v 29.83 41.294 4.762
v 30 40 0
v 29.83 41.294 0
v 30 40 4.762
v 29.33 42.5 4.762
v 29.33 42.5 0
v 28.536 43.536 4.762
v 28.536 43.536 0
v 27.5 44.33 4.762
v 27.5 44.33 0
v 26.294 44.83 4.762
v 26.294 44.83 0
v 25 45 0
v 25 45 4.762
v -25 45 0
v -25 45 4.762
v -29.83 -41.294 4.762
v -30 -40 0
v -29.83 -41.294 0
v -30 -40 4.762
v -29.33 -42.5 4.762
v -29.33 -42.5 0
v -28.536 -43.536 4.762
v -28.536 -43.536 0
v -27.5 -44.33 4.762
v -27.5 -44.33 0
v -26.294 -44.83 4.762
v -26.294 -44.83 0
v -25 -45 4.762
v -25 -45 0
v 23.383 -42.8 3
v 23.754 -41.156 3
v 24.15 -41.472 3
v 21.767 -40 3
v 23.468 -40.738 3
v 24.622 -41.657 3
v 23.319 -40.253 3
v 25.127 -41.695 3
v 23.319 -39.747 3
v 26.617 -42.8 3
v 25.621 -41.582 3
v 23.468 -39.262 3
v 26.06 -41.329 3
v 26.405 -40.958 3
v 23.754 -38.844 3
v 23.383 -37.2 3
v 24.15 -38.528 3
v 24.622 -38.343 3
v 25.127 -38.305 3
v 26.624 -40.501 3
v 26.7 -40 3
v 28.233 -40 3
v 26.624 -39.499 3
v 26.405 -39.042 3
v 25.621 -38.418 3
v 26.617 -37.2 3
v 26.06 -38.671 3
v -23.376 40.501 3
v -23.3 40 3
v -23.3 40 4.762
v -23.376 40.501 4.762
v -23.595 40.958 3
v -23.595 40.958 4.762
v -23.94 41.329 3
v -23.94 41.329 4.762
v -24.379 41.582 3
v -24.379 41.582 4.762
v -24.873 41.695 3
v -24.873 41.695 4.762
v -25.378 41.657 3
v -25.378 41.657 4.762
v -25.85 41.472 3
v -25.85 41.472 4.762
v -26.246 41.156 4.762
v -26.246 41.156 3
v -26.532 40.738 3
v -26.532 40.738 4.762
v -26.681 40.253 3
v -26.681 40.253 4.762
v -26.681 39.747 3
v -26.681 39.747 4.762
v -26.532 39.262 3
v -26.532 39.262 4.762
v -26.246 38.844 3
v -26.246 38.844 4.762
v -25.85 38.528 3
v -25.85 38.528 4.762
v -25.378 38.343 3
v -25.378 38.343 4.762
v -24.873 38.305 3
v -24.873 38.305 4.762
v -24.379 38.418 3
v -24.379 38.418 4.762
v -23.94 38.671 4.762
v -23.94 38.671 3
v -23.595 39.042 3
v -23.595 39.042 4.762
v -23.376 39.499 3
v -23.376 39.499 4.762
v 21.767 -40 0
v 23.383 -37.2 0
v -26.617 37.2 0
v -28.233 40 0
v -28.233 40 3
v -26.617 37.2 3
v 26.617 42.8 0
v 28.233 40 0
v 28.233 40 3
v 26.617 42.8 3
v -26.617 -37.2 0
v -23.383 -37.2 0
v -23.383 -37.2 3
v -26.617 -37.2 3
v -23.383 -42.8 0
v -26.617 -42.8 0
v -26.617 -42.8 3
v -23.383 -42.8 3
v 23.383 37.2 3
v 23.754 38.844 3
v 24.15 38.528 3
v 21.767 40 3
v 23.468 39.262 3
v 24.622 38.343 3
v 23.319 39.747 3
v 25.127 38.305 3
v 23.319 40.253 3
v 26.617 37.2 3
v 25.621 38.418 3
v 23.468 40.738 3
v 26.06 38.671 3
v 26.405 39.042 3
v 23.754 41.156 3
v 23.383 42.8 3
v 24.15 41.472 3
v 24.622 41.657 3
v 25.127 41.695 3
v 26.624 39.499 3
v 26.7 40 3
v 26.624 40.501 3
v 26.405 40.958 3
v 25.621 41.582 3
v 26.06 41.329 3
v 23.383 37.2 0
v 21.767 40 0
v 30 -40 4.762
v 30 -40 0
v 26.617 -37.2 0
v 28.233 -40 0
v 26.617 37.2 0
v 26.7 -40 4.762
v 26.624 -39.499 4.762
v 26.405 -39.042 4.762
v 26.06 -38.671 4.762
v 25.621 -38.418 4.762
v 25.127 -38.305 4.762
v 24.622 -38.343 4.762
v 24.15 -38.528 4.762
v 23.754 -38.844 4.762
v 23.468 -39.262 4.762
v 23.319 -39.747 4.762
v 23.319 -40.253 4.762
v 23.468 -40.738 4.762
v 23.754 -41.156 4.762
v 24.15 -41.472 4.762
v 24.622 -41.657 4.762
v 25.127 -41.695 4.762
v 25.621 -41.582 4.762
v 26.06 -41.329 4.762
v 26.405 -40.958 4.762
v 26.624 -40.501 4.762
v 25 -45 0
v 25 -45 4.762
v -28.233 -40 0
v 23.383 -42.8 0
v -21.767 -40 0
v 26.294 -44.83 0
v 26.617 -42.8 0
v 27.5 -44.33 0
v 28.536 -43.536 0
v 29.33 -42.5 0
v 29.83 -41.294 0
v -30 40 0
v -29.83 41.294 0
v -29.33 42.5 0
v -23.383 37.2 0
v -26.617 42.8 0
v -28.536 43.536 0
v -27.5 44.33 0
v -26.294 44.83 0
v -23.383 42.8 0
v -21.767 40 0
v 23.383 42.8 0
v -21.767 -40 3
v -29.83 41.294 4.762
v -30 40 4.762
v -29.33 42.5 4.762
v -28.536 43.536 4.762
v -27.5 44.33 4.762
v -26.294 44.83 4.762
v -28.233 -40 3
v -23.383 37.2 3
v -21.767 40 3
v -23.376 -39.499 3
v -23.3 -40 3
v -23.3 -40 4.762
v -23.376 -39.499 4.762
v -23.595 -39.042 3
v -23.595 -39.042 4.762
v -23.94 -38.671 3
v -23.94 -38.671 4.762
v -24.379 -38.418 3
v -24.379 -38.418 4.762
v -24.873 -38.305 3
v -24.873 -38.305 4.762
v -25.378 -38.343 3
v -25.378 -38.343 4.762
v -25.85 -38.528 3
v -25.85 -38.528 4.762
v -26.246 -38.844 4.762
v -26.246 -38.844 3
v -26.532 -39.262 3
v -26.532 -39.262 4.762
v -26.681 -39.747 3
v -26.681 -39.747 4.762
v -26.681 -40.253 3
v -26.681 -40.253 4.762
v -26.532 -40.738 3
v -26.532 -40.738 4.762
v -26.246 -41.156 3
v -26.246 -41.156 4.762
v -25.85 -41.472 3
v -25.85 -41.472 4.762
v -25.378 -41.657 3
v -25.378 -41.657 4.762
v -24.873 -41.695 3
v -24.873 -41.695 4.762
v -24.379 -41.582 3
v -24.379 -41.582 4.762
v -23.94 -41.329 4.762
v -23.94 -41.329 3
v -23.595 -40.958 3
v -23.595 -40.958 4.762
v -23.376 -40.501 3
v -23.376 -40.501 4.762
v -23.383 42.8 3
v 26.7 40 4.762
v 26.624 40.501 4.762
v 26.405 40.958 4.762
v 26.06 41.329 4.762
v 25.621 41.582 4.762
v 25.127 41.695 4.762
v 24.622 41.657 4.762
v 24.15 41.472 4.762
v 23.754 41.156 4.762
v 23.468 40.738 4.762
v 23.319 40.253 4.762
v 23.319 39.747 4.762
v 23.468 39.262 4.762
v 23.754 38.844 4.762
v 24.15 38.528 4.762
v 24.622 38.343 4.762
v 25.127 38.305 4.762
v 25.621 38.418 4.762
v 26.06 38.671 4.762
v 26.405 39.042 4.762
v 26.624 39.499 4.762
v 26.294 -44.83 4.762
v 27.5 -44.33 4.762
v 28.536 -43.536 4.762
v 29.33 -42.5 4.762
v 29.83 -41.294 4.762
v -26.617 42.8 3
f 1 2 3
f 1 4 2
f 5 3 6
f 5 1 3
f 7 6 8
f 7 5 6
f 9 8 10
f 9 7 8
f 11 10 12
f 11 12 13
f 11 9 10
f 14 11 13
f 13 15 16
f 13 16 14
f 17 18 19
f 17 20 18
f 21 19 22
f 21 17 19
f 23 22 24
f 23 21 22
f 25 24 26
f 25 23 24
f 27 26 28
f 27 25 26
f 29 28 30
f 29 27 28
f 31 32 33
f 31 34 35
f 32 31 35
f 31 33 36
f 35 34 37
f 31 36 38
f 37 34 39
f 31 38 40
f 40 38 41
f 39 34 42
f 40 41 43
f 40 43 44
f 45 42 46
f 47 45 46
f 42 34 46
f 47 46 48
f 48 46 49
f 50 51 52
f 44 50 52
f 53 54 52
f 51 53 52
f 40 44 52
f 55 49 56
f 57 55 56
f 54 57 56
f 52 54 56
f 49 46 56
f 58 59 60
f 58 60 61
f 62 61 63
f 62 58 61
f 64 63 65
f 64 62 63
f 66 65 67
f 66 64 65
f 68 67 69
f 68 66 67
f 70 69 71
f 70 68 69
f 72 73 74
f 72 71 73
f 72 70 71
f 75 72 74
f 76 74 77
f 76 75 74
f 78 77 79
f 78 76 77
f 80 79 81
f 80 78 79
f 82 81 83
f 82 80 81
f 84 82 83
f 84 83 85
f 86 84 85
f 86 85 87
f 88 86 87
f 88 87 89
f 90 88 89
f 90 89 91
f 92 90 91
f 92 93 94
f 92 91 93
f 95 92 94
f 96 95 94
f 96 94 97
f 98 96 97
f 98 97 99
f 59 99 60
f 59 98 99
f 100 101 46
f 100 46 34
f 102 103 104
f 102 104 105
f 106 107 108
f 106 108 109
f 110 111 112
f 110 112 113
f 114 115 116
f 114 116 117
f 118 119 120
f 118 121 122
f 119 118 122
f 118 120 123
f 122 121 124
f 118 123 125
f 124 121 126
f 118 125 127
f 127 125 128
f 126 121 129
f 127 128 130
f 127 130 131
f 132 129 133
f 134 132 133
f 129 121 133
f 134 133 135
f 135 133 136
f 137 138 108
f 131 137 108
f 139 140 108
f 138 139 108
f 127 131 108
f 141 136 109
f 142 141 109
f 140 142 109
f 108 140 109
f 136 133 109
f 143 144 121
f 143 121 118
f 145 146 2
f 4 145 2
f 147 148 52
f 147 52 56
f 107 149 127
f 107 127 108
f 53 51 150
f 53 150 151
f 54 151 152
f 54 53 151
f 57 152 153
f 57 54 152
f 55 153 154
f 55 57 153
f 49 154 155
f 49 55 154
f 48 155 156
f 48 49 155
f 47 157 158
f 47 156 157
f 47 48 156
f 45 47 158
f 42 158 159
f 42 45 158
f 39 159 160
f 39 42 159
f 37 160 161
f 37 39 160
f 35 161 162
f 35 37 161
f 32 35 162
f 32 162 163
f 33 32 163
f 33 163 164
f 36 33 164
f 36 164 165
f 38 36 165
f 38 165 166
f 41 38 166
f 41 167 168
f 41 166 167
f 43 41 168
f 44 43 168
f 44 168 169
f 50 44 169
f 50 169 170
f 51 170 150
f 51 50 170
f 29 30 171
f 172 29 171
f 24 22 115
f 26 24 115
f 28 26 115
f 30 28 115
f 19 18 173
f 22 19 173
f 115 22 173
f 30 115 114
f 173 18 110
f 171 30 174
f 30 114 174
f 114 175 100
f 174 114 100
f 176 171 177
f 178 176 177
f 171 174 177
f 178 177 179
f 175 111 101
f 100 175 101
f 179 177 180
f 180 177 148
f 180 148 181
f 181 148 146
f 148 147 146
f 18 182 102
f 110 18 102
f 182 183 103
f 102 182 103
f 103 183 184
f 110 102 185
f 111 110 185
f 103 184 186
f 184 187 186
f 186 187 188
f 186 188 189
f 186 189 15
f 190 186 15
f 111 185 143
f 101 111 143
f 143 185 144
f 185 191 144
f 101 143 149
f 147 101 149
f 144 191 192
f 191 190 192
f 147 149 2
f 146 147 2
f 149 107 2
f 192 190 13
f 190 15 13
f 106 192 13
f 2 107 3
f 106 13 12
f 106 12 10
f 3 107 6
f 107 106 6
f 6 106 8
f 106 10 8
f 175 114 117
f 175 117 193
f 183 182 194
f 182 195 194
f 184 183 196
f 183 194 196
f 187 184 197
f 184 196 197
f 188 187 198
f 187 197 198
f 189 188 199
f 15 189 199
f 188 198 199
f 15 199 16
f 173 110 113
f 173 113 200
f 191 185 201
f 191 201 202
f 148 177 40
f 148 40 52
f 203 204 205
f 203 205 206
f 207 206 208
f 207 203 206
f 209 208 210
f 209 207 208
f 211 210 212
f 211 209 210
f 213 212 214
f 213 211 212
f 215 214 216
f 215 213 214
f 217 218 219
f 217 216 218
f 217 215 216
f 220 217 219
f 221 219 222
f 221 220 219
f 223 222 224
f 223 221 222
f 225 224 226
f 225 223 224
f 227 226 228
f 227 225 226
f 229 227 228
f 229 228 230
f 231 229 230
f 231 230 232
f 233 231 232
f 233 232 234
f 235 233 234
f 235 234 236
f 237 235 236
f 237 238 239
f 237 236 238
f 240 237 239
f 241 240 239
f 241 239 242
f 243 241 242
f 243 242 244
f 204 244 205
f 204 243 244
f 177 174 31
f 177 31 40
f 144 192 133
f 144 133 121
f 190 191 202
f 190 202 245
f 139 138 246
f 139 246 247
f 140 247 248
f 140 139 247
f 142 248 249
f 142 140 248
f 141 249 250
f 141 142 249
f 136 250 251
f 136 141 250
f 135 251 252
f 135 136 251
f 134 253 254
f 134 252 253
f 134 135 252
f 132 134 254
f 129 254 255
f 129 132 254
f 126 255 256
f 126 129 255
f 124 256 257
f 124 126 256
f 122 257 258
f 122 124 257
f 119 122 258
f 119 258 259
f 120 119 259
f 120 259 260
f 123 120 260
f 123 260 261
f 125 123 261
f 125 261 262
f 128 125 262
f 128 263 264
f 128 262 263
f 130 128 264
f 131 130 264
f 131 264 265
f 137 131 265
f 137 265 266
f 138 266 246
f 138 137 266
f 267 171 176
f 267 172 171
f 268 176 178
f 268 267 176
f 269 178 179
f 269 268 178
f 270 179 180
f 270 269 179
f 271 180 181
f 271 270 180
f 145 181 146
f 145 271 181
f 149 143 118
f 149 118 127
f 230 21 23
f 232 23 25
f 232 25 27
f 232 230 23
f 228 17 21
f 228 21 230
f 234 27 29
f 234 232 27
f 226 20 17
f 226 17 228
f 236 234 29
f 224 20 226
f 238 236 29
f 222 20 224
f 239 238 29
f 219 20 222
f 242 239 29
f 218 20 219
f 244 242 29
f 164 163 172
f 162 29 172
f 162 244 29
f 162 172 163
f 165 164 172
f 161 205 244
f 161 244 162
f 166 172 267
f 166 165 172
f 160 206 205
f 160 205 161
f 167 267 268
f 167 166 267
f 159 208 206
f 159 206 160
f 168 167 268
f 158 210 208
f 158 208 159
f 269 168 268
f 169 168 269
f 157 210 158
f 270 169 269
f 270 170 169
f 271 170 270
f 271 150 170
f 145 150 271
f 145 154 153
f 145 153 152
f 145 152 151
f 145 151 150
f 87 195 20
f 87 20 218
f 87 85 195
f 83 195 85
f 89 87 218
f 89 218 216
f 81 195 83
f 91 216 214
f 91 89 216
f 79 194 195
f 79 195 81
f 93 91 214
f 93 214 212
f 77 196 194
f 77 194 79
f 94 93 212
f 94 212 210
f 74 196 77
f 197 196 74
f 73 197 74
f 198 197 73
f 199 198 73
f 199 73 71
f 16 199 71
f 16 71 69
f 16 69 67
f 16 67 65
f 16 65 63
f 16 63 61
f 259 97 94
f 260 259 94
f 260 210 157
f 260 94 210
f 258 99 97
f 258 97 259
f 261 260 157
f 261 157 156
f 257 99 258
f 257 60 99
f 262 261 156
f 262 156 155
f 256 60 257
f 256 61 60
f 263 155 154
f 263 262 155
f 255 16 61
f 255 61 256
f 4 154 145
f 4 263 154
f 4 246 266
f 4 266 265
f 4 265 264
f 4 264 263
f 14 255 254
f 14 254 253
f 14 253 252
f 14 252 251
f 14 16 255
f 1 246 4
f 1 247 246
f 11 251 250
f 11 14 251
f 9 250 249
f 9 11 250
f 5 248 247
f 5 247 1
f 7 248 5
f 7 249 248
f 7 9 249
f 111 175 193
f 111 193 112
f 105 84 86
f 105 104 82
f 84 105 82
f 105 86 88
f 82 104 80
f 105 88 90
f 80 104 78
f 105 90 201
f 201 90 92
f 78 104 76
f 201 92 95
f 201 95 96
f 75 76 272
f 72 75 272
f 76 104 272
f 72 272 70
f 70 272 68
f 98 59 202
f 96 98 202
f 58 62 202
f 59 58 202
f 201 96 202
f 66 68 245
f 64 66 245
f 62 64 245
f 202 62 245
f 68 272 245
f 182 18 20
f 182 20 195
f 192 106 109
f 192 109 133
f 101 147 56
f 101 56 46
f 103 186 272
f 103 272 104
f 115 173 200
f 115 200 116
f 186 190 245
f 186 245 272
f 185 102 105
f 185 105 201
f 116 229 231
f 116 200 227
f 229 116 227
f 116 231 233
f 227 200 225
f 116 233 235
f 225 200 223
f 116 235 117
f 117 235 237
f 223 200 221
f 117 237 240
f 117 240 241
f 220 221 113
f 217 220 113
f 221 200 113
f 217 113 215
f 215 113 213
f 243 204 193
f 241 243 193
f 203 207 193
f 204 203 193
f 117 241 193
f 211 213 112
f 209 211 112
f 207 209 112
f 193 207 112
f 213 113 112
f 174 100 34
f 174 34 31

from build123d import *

# Parameters (mm, degrees)
SKETCH1_W           = 60
SKETCH1_H           = 90
BOSS_EXTRUDE1_DEPTH = 4.7625
FILLET1_R           = 5
SKETCH2_R           = 1.7
CUT_EXTRUDE1_DEPTH  = 5
CUT_EXTRUDE2_DEPTH  = 3


with BuildPart() as part:
    # Sketch1 → Boss-Extrude1 (new body)
    with BuildSketch(Plane.XY):
        Rectangle(SKETCH1_W, SKETCH1_H)
    extrude(amount=BOSS_EXTRUDE1_DEPTH)

    # Fillet1
    fillet1_edges = [part.edges().sort_by_distance(p)[0] for p in [
        (-30, 45, 2.38125),
        (30, 45, 2.38125),
        (30, -45, 2.38125),
        (-30, -45, 2.38125),
    ]]
    fillet(fillet1_edges, radius=FILLET1_R)

    # Sketch2 → Cut-Extrude1 (cut)
    with BuildSketch(Plane.XY):
        with Locations((-25, 40)):
            Circle(SKETCH2_R)
        with Locations((25, 40)):
            Circle(SKETCH2_R)
        with Locations((25, -40)):
            Circle(SKETCH2_R)
        with Locations((-25, -40)):
            Circle(SKETCH2_R)
    extrude(amount=CUT_EXTRUDE1_DEPTH, mode=Mode.SUBTRACT)

    # Sketch3 → Cut-Extrude2 (cut)
    with BuildSketch(Plane.XY):
        Polygon((-23.383419246, 37.2), (-21.766838493, 40), (-23.383419246, 42.8), (-26.616580754, 42.8), (-28.233161507, 40), (-26.616580754, 37.2), align=None)
        Polygon((26.616580754, 37.2), (28.233161507, 40), (26.616580754, 42.8), (23.383419246, 42.8), (21.766838493, 40), (23.383419246, 37.2), align=None)
        Polygon((26.616580754, -42.8), (28.233161507, -40), (26.616580754, -37.2), (23.383419246, -37.2), (21.766838493, -40), (23.383419246, -42.8), align=None)
        Polygon((-23.383419246, -42.8), (-21.766838493, -40), (-23.383419246, -37.2), (-26.616580754, -37.2), (-28.233161507, -40), (-26.616580754, -42.8), align=None)
    extrude(amount=CUT_EXTRUDE2_DEPTH, mode=Mode.SUBTRACT)


solid = part.part
